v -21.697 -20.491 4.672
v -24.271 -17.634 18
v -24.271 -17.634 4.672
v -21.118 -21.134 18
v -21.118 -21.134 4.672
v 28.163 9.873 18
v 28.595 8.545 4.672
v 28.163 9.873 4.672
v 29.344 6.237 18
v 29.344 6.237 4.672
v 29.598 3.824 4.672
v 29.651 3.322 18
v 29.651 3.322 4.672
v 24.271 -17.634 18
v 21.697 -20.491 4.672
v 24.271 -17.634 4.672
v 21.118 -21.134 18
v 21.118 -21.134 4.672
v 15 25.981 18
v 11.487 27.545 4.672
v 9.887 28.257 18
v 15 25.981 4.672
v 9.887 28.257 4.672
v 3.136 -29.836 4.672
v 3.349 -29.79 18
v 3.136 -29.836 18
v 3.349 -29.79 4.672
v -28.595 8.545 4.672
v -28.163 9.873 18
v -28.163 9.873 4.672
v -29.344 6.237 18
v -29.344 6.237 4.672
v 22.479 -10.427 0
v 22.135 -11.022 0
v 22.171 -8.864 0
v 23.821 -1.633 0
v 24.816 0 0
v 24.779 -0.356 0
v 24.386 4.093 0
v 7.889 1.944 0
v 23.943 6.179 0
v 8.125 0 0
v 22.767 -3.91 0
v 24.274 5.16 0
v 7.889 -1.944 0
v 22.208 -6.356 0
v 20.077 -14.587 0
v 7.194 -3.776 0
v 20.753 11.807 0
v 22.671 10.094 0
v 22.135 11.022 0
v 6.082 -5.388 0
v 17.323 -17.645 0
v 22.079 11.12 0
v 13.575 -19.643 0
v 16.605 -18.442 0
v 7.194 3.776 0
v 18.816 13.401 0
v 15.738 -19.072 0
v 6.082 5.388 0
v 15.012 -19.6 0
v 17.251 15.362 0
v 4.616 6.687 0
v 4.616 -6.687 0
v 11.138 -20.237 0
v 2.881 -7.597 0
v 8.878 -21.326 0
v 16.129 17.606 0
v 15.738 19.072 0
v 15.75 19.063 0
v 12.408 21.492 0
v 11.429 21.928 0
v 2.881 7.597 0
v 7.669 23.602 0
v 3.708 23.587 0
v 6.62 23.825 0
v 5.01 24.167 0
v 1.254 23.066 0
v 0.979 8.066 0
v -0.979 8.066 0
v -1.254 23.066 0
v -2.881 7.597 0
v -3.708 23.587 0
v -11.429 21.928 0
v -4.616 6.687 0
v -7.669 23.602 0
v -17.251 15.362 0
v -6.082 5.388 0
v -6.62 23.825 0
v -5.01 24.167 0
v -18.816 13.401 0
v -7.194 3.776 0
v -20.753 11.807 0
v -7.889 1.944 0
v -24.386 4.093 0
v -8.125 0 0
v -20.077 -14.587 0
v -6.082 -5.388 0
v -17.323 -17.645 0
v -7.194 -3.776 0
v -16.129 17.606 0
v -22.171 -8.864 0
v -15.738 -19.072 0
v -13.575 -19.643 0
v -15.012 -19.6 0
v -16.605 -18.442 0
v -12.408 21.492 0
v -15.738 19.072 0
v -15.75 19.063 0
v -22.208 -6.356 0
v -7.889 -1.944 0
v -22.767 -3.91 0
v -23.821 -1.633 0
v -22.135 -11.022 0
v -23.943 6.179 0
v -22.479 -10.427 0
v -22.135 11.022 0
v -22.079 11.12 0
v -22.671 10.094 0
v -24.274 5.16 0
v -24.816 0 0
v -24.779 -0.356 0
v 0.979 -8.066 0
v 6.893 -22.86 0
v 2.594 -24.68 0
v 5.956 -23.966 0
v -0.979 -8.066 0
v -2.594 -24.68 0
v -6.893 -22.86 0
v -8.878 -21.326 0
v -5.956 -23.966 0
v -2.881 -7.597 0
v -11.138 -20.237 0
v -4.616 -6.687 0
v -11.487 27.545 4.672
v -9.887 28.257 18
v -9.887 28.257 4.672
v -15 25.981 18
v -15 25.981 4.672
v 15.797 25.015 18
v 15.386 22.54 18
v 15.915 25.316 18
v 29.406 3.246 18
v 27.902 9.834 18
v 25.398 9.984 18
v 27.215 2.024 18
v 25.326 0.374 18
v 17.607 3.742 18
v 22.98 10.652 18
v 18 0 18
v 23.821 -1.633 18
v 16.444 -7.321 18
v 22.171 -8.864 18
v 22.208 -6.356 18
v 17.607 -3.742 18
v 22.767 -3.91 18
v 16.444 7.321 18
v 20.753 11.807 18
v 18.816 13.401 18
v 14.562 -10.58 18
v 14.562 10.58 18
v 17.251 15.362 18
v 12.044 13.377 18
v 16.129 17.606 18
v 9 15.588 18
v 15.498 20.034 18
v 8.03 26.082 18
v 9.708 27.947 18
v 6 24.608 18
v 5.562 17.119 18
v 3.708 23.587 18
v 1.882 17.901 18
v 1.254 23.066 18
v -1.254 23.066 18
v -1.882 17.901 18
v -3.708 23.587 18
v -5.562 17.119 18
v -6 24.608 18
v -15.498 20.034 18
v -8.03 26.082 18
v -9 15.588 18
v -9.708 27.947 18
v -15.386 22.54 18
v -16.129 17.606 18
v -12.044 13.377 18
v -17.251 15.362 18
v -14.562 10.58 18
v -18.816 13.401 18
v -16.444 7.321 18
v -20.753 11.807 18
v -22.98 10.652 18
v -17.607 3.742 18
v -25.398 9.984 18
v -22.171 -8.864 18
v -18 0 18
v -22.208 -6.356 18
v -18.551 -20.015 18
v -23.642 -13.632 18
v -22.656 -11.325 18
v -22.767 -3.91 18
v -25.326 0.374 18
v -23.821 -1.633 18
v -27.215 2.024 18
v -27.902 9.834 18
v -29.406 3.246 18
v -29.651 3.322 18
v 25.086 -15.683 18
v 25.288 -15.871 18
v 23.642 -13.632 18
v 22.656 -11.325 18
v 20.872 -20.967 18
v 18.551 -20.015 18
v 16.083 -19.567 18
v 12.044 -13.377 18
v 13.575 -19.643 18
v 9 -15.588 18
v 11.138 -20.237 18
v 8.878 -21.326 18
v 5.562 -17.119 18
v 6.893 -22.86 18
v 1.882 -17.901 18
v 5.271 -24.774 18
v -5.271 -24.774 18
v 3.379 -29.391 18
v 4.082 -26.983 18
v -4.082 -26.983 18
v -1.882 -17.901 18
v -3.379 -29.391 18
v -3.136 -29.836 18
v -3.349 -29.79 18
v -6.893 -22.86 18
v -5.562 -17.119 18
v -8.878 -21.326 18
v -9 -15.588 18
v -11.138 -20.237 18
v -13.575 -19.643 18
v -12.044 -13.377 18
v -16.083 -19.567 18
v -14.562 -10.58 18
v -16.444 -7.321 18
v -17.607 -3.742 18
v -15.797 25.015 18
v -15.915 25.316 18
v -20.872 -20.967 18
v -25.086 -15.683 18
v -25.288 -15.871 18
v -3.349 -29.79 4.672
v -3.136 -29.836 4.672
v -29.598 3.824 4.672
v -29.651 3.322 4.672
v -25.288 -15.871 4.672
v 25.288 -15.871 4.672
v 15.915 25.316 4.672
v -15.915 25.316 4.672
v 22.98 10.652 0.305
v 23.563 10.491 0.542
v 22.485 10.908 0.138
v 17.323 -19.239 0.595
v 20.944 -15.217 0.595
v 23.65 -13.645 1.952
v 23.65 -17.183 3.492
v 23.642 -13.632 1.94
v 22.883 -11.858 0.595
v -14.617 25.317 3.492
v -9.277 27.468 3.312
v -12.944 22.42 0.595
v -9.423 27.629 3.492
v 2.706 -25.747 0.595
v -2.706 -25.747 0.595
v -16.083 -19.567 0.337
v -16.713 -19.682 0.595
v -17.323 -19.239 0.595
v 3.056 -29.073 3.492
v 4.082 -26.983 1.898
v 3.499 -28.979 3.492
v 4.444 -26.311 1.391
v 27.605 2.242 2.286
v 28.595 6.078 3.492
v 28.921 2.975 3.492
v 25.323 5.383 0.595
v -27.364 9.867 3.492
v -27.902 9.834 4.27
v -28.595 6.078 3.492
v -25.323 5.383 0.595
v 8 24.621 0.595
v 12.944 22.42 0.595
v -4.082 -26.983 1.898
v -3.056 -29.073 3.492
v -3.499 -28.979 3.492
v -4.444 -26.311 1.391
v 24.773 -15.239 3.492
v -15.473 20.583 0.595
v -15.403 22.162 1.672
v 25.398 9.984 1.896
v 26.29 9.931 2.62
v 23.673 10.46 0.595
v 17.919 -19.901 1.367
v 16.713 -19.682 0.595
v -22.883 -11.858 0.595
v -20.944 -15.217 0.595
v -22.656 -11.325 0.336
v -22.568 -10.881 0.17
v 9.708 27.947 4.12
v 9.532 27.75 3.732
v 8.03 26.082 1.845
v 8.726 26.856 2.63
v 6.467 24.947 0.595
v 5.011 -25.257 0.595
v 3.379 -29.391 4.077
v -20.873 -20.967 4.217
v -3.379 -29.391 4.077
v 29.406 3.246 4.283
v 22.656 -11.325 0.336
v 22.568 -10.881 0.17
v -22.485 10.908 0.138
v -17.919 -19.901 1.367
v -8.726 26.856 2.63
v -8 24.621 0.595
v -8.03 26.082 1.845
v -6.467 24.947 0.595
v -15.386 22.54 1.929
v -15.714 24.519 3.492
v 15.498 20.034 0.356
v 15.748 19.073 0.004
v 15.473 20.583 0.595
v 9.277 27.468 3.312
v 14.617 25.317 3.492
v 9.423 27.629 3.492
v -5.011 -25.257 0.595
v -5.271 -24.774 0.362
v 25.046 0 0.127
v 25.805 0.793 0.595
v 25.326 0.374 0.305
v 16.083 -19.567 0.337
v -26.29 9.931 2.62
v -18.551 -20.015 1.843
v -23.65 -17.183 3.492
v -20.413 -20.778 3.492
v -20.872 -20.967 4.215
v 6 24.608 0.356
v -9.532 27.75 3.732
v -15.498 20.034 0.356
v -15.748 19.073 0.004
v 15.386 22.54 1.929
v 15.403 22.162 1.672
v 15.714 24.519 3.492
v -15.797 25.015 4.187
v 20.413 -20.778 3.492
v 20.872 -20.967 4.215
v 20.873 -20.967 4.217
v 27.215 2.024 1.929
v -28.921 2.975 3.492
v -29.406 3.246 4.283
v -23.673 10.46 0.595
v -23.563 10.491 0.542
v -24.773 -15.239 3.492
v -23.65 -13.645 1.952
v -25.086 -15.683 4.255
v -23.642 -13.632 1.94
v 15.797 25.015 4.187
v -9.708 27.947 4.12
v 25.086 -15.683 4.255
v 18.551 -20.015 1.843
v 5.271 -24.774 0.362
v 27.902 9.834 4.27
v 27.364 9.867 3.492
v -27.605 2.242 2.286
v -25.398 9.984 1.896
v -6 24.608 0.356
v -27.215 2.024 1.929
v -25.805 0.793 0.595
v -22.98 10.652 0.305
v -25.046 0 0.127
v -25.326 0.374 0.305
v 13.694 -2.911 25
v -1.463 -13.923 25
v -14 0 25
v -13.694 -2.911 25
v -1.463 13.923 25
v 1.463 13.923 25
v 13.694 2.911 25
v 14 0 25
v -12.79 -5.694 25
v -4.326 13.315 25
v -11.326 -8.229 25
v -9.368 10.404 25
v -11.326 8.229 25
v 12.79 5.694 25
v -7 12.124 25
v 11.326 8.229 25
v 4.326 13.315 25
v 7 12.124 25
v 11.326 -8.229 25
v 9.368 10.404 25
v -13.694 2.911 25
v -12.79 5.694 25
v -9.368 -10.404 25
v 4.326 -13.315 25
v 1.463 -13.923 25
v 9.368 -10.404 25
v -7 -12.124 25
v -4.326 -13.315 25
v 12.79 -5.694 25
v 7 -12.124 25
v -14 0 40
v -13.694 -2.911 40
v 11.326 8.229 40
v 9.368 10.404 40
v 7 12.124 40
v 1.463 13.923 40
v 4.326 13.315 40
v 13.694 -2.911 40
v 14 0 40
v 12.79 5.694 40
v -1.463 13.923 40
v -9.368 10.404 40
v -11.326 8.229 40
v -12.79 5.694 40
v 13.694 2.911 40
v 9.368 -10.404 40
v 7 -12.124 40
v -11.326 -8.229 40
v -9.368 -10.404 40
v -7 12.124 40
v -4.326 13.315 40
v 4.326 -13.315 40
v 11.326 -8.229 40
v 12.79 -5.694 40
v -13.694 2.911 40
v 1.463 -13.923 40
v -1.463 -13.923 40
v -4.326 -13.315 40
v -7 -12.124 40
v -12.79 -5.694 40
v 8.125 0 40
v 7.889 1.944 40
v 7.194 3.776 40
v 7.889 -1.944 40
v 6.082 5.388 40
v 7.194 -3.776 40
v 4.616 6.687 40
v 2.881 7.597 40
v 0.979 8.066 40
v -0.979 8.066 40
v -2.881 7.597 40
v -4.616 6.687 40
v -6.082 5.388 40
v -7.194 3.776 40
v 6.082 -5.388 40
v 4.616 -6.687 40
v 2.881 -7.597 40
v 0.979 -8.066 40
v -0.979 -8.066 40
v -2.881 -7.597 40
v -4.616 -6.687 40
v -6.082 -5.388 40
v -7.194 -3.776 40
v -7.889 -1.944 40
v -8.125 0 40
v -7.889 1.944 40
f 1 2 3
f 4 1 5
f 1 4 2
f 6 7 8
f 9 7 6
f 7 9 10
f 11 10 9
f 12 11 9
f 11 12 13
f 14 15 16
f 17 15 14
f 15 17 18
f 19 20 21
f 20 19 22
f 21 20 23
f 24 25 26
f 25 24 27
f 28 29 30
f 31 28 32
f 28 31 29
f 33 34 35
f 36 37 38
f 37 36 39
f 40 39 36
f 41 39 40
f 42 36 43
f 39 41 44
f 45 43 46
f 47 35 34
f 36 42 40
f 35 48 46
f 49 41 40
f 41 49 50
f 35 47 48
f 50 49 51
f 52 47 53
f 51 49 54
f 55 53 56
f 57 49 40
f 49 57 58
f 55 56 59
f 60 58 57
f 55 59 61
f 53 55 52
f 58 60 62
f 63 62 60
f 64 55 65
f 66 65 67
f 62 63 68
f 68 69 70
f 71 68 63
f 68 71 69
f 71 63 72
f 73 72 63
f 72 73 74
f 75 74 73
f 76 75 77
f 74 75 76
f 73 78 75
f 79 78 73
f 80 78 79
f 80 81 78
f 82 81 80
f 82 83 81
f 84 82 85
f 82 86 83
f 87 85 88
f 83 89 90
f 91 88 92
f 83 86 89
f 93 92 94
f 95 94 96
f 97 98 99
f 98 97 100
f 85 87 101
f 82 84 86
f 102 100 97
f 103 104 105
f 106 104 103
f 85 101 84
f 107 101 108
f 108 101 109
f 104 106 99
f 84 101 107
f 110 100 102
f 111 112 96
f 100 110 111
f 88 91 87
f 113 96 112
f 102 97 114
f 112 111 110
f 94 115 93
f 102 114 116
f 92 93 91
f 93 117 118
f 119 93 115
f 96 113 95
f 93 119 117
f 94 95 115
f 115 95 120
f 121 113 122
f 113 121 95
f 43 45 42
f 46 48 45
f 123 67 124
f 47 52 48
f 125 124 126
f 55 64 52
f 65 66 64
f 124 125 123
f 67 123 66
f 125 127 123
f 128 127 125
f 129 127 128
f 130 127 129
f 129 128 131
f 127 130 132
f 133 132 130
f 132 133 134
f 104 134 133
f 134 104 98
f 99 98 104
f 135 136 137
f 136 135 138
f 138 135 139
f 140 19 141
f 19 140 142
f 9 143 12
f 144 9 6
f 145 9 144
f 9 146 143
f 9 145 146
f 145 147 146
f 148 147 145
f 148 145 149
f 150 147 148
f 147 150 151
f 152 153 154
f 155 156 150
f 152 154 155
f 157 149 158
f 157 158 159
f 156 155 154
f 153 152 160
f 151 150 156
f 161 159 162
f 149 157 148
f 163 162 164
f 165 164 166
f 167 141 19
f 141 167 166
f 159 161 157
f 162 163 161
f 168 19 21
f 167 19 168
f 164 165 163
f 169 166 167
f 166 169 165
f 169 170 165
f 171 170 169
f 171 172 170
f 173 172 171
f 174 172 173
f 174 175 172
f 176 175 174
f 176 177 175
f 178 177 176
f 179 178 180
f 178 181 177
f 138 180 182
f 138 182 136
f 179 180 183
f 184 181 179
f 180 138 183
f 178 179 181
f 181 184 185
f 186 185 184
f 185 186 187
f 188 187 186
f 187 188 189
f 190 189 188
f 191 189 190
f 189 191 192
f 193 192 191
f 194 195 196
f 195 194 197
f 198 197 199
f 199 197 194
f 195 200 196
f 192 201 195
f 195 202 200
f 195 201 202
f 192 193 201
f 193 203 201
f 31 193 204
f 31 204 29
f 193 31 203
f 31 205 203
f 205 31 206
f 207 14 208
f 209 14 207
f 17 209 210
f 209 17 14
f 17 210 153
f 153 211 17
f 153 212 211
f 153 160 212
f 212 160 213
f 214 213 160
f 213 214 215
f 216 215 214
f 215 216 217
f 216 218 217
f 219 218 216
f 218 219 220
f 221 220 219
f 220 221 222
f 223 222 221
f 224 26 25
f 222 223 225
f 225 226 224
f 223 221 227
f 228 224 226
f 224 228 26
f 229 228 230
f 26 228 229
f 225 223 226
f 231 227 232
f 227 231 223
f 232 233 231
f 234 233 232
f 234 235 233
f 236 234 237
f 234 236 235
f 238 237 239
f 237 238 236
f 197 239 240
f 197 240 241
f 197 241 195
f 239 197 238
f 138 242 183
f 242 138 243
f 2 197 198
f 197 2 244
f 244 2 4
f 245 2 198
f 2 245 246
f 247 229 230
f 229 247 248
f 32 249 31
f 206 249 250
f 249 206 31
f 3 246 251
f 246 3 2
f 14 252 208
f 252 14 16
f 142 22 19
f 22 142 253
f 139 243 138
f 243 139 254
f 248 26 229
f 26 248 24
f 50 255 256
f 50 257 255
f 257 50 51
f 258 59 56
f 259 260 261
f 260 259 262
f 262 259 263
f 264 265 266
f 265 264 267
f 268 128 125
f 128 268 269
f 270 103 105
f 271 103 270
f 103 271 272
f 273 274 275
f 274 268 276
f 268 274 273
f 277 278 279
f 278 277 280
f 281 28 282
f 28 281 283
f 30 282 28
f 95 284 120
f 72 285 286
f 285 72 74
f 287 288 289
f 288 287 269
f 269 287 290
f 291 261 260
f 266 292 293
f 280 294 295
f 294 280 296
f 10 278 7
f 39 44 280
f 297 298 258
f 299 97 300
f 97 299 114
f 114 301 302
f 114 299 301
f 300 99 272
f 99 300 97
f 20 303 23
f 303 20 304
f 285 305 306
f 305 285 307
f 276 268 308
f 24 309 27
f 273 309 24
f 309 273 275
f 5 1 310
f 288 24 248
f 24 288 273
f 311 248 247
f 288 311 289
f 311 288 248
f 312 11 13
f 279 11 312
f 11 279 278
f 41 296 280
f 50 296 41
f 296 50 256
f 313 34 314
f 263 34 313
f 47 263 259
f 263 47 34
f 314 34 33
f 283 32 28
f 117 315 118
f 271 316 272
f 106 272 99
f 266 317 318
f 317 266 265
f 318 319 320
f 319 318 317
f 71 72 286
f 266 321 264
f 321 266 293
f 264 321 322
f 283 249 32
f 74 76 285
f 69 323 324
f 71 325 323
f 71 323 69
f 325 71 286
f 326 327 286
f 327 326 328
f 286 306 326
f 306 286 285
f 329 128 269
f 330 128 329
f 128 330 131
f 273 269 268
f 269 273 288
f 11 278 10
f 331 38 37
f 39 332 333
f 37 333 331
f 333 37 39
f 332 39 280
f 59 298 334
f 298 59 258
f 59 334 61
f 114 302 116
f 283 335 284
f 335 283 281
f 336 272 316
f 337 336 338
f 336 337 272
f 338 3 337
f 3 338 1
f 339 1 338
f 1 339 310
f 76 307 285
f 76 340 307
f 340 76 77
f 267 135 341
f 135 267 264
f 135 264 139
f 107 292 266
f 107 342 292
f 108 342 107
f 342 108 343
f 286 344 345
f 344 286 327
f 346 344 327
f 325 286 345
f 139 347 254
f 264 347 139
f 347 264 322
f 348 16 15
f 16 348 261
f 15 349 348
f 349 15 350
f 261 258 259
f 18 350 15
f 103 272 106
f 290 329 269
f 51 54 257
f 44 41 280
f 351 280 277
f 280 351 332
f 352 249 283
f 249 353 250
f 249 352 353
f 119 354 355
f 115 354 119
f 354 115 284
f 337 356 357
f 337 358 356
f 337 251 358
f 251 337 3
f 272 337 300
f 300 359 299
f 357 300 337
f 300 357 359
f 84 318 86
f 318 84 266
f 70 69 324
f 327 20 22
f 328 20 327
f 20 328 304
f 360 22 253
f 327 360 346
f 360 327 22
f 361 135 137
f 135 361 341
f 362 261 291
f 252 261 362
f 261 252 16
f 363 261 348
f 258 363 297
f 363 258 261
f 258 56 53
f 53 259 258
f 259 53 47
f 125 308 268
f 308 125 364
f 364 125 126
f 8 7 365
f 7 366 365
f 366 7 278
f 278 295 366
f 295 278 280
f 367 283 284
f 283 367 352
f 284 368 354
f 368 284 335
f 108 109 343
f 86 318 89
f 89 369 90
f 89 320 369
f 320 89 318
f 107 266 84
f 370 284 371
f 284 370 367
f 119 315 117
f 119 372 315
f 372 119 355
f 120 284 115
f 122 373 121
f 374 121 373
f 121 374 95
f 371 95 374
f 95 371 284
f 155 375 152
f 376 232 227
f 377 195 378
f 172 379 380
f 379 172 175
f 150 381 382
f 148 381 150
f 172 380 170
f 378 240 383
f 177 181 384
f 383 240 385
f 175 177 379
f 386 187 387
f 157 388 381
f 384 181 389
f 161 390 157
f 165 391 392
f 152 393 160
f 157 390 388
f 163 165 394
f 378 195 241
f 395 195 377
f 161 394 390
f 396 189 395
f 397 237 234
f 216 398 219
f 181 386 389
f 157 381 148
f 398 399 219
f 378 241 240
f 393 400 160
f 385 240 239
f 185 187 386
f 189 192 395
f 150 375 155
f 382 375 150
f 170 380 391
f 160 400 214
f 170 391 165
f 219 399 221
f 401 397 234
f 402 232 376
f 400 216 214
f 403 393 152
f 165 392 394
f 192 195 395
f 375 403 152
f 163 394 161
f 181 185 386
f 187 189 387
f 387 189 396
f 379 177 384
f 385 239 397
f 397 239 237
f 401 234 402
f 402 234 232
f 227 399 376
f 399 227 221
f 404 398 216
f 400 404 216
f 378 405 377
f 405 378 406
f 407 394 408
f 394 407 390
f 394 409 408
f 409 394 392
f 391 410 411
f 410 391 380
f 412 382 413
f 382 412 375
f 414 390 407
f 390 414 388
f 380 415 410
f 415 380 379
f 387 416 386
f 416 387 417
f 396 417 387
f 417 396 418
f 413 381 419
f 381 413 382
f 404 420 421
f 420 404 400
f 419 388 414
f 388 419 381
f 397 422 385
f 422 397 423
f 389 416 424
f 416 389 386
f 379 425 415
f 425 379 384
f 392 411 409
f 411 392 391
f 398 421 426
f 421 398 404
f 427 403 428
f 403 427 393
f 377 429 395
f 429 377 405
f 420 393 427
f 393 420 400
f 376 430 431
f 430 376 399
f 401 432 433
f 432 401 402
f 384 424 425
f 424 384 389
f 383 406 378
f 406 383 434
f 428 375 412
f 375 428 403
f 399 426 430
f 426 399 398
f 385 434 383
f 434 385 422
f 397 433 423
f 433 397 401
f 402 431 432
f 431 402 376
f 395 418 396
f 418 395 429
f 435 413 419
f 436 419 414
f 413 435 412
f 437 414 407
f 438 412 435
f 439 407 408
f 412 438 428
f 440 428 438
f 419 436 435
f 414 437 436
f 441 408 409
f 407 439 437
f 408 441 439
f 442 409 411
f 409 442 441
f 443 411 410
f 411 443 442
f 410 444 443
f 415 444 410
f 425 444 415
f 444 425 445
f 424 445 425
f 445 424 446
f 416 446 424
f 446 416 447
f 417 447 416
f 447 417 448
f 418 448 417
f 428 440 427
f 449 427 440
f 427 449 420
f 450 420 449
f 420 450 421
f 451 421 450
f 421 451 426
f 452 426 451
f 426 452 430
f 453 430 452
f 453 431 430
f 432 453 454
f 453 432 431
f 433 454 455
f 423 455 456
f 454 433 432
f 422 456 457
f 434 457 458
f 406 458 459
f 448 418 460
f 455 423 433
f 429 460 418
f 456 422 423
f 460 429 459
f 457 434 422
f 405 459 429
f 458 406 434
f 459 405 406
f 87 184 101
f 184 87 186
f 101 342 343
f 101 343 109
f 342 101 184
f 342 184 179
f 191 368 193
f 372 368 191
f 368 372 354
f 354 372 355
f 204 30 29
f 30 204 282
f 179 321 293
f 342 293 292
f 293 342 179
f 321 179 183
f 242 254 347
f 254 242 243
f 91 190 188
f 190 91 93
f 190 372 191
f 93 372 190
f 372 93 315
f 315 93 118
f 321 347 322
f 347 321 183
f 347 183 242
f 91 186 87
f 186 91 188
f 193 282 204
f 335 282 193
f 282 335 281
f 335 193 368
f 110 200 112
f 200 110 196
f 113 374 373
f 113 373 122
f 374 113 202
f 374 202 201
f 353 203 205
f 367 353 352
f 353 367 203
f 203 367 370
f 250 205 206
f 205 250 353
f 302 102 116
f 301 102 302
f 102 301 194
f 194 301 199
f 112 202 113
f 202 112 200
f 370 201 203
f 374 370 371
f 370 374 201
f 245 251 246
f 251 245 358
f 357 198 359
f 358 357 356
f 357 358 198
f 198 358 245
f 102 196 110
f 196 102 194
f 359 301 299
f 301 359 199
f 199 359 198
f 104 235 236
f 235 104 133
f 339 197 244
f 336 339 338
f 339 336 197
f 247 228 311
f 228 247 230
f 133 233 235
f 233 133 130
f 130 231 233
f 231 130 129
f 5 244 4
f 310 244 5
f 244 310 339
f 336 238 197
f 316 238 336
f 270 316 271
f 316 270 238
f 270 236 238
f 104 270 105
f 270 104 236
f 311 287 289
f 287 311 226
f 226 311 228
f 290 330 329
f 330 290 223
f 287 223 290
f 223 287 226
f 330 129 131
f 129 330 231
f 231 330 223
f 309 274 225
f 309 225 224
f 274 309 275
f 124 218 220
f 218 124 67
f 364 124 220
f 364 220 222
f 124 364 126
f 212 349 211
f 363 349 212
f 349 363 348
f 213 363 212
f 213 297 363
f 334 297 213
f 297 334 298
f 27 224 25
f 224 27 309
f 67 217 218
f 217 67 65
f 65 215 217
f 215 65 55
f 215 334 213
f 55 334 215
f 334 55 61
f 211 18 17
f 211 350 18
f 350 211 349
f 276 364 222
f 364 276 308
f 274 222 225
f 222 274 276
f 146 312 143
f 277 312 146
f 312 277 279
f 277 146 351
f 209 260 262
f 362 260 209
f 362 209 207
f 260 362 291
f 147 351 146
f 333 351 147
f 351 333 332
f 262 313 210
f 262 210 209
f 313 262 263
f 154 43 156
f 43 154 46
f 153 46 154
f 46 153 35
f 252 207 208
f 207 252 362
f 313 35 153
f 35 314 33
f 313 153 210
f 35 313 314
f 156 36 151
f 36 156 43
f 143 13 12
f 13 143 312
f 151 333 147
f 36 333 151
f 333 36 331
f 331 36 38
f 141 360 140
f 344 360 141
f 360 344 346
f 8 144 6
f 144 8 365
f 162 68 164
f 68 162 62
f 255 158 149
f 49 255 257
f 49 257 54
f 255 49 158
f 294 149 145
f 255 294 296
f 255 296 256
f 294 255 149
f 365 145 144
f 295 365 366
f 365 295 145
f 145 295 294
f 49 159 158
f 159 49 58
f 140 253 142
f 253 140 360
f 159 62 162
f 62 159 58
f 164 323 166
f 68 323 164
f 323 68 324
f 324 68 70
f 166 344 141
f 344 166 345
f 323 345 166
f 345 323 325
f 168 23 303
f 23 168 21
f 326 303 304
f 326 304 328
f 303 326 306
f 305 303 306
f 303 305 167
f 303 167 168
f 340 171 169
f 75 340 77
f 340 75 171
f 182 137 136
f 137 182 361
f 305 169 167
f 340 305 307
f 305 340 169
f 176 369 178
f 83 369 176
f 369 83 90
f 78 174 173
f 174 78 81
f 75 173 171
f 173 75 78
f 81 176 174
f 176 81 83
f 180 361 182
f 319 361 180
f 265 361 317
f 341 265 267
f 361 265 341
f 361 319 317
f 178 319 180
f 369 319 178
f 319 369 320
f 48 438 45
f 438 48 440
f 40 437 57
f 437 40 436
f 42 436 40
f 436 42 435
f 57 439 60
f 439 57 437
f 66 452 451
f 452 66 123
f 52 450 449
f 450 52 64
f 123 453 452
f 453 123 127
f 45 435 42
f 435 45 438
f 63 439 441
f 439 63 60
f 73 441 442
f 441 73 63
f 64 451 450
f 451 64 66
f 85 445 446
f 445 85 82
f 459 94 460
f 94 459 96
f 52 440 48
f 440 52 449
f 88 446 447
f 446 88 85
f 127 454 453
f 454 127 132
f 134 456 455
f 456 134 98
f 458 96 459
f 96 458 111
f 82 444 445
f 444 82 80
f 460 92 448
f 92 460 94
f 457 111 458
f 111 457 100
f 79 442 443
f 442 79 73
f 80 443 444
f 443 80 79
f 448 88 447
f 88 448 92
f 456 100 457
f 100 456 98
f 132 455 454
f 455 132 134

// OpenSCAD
difference() {
    union() {
        intersection() {
            cylinder(r=30,h=18);
            translate([0,0,10])scale([1,1,0.5])sphere(r=32);
        }
        translate([0,0,10])cylinder(r=30,h=8);
        translate([0,0,18])cylinder(r1=18,r2=14,h=7);
        cylinder(r=14,h=40);
    }
    cylinder(r=6.5*1.25,h=40);
    a=7;
    for(i=[1:a]) {
        rotate([0,0,360/a*i])translate([0,35])cylinder(r=12,h=18);
    }
}
